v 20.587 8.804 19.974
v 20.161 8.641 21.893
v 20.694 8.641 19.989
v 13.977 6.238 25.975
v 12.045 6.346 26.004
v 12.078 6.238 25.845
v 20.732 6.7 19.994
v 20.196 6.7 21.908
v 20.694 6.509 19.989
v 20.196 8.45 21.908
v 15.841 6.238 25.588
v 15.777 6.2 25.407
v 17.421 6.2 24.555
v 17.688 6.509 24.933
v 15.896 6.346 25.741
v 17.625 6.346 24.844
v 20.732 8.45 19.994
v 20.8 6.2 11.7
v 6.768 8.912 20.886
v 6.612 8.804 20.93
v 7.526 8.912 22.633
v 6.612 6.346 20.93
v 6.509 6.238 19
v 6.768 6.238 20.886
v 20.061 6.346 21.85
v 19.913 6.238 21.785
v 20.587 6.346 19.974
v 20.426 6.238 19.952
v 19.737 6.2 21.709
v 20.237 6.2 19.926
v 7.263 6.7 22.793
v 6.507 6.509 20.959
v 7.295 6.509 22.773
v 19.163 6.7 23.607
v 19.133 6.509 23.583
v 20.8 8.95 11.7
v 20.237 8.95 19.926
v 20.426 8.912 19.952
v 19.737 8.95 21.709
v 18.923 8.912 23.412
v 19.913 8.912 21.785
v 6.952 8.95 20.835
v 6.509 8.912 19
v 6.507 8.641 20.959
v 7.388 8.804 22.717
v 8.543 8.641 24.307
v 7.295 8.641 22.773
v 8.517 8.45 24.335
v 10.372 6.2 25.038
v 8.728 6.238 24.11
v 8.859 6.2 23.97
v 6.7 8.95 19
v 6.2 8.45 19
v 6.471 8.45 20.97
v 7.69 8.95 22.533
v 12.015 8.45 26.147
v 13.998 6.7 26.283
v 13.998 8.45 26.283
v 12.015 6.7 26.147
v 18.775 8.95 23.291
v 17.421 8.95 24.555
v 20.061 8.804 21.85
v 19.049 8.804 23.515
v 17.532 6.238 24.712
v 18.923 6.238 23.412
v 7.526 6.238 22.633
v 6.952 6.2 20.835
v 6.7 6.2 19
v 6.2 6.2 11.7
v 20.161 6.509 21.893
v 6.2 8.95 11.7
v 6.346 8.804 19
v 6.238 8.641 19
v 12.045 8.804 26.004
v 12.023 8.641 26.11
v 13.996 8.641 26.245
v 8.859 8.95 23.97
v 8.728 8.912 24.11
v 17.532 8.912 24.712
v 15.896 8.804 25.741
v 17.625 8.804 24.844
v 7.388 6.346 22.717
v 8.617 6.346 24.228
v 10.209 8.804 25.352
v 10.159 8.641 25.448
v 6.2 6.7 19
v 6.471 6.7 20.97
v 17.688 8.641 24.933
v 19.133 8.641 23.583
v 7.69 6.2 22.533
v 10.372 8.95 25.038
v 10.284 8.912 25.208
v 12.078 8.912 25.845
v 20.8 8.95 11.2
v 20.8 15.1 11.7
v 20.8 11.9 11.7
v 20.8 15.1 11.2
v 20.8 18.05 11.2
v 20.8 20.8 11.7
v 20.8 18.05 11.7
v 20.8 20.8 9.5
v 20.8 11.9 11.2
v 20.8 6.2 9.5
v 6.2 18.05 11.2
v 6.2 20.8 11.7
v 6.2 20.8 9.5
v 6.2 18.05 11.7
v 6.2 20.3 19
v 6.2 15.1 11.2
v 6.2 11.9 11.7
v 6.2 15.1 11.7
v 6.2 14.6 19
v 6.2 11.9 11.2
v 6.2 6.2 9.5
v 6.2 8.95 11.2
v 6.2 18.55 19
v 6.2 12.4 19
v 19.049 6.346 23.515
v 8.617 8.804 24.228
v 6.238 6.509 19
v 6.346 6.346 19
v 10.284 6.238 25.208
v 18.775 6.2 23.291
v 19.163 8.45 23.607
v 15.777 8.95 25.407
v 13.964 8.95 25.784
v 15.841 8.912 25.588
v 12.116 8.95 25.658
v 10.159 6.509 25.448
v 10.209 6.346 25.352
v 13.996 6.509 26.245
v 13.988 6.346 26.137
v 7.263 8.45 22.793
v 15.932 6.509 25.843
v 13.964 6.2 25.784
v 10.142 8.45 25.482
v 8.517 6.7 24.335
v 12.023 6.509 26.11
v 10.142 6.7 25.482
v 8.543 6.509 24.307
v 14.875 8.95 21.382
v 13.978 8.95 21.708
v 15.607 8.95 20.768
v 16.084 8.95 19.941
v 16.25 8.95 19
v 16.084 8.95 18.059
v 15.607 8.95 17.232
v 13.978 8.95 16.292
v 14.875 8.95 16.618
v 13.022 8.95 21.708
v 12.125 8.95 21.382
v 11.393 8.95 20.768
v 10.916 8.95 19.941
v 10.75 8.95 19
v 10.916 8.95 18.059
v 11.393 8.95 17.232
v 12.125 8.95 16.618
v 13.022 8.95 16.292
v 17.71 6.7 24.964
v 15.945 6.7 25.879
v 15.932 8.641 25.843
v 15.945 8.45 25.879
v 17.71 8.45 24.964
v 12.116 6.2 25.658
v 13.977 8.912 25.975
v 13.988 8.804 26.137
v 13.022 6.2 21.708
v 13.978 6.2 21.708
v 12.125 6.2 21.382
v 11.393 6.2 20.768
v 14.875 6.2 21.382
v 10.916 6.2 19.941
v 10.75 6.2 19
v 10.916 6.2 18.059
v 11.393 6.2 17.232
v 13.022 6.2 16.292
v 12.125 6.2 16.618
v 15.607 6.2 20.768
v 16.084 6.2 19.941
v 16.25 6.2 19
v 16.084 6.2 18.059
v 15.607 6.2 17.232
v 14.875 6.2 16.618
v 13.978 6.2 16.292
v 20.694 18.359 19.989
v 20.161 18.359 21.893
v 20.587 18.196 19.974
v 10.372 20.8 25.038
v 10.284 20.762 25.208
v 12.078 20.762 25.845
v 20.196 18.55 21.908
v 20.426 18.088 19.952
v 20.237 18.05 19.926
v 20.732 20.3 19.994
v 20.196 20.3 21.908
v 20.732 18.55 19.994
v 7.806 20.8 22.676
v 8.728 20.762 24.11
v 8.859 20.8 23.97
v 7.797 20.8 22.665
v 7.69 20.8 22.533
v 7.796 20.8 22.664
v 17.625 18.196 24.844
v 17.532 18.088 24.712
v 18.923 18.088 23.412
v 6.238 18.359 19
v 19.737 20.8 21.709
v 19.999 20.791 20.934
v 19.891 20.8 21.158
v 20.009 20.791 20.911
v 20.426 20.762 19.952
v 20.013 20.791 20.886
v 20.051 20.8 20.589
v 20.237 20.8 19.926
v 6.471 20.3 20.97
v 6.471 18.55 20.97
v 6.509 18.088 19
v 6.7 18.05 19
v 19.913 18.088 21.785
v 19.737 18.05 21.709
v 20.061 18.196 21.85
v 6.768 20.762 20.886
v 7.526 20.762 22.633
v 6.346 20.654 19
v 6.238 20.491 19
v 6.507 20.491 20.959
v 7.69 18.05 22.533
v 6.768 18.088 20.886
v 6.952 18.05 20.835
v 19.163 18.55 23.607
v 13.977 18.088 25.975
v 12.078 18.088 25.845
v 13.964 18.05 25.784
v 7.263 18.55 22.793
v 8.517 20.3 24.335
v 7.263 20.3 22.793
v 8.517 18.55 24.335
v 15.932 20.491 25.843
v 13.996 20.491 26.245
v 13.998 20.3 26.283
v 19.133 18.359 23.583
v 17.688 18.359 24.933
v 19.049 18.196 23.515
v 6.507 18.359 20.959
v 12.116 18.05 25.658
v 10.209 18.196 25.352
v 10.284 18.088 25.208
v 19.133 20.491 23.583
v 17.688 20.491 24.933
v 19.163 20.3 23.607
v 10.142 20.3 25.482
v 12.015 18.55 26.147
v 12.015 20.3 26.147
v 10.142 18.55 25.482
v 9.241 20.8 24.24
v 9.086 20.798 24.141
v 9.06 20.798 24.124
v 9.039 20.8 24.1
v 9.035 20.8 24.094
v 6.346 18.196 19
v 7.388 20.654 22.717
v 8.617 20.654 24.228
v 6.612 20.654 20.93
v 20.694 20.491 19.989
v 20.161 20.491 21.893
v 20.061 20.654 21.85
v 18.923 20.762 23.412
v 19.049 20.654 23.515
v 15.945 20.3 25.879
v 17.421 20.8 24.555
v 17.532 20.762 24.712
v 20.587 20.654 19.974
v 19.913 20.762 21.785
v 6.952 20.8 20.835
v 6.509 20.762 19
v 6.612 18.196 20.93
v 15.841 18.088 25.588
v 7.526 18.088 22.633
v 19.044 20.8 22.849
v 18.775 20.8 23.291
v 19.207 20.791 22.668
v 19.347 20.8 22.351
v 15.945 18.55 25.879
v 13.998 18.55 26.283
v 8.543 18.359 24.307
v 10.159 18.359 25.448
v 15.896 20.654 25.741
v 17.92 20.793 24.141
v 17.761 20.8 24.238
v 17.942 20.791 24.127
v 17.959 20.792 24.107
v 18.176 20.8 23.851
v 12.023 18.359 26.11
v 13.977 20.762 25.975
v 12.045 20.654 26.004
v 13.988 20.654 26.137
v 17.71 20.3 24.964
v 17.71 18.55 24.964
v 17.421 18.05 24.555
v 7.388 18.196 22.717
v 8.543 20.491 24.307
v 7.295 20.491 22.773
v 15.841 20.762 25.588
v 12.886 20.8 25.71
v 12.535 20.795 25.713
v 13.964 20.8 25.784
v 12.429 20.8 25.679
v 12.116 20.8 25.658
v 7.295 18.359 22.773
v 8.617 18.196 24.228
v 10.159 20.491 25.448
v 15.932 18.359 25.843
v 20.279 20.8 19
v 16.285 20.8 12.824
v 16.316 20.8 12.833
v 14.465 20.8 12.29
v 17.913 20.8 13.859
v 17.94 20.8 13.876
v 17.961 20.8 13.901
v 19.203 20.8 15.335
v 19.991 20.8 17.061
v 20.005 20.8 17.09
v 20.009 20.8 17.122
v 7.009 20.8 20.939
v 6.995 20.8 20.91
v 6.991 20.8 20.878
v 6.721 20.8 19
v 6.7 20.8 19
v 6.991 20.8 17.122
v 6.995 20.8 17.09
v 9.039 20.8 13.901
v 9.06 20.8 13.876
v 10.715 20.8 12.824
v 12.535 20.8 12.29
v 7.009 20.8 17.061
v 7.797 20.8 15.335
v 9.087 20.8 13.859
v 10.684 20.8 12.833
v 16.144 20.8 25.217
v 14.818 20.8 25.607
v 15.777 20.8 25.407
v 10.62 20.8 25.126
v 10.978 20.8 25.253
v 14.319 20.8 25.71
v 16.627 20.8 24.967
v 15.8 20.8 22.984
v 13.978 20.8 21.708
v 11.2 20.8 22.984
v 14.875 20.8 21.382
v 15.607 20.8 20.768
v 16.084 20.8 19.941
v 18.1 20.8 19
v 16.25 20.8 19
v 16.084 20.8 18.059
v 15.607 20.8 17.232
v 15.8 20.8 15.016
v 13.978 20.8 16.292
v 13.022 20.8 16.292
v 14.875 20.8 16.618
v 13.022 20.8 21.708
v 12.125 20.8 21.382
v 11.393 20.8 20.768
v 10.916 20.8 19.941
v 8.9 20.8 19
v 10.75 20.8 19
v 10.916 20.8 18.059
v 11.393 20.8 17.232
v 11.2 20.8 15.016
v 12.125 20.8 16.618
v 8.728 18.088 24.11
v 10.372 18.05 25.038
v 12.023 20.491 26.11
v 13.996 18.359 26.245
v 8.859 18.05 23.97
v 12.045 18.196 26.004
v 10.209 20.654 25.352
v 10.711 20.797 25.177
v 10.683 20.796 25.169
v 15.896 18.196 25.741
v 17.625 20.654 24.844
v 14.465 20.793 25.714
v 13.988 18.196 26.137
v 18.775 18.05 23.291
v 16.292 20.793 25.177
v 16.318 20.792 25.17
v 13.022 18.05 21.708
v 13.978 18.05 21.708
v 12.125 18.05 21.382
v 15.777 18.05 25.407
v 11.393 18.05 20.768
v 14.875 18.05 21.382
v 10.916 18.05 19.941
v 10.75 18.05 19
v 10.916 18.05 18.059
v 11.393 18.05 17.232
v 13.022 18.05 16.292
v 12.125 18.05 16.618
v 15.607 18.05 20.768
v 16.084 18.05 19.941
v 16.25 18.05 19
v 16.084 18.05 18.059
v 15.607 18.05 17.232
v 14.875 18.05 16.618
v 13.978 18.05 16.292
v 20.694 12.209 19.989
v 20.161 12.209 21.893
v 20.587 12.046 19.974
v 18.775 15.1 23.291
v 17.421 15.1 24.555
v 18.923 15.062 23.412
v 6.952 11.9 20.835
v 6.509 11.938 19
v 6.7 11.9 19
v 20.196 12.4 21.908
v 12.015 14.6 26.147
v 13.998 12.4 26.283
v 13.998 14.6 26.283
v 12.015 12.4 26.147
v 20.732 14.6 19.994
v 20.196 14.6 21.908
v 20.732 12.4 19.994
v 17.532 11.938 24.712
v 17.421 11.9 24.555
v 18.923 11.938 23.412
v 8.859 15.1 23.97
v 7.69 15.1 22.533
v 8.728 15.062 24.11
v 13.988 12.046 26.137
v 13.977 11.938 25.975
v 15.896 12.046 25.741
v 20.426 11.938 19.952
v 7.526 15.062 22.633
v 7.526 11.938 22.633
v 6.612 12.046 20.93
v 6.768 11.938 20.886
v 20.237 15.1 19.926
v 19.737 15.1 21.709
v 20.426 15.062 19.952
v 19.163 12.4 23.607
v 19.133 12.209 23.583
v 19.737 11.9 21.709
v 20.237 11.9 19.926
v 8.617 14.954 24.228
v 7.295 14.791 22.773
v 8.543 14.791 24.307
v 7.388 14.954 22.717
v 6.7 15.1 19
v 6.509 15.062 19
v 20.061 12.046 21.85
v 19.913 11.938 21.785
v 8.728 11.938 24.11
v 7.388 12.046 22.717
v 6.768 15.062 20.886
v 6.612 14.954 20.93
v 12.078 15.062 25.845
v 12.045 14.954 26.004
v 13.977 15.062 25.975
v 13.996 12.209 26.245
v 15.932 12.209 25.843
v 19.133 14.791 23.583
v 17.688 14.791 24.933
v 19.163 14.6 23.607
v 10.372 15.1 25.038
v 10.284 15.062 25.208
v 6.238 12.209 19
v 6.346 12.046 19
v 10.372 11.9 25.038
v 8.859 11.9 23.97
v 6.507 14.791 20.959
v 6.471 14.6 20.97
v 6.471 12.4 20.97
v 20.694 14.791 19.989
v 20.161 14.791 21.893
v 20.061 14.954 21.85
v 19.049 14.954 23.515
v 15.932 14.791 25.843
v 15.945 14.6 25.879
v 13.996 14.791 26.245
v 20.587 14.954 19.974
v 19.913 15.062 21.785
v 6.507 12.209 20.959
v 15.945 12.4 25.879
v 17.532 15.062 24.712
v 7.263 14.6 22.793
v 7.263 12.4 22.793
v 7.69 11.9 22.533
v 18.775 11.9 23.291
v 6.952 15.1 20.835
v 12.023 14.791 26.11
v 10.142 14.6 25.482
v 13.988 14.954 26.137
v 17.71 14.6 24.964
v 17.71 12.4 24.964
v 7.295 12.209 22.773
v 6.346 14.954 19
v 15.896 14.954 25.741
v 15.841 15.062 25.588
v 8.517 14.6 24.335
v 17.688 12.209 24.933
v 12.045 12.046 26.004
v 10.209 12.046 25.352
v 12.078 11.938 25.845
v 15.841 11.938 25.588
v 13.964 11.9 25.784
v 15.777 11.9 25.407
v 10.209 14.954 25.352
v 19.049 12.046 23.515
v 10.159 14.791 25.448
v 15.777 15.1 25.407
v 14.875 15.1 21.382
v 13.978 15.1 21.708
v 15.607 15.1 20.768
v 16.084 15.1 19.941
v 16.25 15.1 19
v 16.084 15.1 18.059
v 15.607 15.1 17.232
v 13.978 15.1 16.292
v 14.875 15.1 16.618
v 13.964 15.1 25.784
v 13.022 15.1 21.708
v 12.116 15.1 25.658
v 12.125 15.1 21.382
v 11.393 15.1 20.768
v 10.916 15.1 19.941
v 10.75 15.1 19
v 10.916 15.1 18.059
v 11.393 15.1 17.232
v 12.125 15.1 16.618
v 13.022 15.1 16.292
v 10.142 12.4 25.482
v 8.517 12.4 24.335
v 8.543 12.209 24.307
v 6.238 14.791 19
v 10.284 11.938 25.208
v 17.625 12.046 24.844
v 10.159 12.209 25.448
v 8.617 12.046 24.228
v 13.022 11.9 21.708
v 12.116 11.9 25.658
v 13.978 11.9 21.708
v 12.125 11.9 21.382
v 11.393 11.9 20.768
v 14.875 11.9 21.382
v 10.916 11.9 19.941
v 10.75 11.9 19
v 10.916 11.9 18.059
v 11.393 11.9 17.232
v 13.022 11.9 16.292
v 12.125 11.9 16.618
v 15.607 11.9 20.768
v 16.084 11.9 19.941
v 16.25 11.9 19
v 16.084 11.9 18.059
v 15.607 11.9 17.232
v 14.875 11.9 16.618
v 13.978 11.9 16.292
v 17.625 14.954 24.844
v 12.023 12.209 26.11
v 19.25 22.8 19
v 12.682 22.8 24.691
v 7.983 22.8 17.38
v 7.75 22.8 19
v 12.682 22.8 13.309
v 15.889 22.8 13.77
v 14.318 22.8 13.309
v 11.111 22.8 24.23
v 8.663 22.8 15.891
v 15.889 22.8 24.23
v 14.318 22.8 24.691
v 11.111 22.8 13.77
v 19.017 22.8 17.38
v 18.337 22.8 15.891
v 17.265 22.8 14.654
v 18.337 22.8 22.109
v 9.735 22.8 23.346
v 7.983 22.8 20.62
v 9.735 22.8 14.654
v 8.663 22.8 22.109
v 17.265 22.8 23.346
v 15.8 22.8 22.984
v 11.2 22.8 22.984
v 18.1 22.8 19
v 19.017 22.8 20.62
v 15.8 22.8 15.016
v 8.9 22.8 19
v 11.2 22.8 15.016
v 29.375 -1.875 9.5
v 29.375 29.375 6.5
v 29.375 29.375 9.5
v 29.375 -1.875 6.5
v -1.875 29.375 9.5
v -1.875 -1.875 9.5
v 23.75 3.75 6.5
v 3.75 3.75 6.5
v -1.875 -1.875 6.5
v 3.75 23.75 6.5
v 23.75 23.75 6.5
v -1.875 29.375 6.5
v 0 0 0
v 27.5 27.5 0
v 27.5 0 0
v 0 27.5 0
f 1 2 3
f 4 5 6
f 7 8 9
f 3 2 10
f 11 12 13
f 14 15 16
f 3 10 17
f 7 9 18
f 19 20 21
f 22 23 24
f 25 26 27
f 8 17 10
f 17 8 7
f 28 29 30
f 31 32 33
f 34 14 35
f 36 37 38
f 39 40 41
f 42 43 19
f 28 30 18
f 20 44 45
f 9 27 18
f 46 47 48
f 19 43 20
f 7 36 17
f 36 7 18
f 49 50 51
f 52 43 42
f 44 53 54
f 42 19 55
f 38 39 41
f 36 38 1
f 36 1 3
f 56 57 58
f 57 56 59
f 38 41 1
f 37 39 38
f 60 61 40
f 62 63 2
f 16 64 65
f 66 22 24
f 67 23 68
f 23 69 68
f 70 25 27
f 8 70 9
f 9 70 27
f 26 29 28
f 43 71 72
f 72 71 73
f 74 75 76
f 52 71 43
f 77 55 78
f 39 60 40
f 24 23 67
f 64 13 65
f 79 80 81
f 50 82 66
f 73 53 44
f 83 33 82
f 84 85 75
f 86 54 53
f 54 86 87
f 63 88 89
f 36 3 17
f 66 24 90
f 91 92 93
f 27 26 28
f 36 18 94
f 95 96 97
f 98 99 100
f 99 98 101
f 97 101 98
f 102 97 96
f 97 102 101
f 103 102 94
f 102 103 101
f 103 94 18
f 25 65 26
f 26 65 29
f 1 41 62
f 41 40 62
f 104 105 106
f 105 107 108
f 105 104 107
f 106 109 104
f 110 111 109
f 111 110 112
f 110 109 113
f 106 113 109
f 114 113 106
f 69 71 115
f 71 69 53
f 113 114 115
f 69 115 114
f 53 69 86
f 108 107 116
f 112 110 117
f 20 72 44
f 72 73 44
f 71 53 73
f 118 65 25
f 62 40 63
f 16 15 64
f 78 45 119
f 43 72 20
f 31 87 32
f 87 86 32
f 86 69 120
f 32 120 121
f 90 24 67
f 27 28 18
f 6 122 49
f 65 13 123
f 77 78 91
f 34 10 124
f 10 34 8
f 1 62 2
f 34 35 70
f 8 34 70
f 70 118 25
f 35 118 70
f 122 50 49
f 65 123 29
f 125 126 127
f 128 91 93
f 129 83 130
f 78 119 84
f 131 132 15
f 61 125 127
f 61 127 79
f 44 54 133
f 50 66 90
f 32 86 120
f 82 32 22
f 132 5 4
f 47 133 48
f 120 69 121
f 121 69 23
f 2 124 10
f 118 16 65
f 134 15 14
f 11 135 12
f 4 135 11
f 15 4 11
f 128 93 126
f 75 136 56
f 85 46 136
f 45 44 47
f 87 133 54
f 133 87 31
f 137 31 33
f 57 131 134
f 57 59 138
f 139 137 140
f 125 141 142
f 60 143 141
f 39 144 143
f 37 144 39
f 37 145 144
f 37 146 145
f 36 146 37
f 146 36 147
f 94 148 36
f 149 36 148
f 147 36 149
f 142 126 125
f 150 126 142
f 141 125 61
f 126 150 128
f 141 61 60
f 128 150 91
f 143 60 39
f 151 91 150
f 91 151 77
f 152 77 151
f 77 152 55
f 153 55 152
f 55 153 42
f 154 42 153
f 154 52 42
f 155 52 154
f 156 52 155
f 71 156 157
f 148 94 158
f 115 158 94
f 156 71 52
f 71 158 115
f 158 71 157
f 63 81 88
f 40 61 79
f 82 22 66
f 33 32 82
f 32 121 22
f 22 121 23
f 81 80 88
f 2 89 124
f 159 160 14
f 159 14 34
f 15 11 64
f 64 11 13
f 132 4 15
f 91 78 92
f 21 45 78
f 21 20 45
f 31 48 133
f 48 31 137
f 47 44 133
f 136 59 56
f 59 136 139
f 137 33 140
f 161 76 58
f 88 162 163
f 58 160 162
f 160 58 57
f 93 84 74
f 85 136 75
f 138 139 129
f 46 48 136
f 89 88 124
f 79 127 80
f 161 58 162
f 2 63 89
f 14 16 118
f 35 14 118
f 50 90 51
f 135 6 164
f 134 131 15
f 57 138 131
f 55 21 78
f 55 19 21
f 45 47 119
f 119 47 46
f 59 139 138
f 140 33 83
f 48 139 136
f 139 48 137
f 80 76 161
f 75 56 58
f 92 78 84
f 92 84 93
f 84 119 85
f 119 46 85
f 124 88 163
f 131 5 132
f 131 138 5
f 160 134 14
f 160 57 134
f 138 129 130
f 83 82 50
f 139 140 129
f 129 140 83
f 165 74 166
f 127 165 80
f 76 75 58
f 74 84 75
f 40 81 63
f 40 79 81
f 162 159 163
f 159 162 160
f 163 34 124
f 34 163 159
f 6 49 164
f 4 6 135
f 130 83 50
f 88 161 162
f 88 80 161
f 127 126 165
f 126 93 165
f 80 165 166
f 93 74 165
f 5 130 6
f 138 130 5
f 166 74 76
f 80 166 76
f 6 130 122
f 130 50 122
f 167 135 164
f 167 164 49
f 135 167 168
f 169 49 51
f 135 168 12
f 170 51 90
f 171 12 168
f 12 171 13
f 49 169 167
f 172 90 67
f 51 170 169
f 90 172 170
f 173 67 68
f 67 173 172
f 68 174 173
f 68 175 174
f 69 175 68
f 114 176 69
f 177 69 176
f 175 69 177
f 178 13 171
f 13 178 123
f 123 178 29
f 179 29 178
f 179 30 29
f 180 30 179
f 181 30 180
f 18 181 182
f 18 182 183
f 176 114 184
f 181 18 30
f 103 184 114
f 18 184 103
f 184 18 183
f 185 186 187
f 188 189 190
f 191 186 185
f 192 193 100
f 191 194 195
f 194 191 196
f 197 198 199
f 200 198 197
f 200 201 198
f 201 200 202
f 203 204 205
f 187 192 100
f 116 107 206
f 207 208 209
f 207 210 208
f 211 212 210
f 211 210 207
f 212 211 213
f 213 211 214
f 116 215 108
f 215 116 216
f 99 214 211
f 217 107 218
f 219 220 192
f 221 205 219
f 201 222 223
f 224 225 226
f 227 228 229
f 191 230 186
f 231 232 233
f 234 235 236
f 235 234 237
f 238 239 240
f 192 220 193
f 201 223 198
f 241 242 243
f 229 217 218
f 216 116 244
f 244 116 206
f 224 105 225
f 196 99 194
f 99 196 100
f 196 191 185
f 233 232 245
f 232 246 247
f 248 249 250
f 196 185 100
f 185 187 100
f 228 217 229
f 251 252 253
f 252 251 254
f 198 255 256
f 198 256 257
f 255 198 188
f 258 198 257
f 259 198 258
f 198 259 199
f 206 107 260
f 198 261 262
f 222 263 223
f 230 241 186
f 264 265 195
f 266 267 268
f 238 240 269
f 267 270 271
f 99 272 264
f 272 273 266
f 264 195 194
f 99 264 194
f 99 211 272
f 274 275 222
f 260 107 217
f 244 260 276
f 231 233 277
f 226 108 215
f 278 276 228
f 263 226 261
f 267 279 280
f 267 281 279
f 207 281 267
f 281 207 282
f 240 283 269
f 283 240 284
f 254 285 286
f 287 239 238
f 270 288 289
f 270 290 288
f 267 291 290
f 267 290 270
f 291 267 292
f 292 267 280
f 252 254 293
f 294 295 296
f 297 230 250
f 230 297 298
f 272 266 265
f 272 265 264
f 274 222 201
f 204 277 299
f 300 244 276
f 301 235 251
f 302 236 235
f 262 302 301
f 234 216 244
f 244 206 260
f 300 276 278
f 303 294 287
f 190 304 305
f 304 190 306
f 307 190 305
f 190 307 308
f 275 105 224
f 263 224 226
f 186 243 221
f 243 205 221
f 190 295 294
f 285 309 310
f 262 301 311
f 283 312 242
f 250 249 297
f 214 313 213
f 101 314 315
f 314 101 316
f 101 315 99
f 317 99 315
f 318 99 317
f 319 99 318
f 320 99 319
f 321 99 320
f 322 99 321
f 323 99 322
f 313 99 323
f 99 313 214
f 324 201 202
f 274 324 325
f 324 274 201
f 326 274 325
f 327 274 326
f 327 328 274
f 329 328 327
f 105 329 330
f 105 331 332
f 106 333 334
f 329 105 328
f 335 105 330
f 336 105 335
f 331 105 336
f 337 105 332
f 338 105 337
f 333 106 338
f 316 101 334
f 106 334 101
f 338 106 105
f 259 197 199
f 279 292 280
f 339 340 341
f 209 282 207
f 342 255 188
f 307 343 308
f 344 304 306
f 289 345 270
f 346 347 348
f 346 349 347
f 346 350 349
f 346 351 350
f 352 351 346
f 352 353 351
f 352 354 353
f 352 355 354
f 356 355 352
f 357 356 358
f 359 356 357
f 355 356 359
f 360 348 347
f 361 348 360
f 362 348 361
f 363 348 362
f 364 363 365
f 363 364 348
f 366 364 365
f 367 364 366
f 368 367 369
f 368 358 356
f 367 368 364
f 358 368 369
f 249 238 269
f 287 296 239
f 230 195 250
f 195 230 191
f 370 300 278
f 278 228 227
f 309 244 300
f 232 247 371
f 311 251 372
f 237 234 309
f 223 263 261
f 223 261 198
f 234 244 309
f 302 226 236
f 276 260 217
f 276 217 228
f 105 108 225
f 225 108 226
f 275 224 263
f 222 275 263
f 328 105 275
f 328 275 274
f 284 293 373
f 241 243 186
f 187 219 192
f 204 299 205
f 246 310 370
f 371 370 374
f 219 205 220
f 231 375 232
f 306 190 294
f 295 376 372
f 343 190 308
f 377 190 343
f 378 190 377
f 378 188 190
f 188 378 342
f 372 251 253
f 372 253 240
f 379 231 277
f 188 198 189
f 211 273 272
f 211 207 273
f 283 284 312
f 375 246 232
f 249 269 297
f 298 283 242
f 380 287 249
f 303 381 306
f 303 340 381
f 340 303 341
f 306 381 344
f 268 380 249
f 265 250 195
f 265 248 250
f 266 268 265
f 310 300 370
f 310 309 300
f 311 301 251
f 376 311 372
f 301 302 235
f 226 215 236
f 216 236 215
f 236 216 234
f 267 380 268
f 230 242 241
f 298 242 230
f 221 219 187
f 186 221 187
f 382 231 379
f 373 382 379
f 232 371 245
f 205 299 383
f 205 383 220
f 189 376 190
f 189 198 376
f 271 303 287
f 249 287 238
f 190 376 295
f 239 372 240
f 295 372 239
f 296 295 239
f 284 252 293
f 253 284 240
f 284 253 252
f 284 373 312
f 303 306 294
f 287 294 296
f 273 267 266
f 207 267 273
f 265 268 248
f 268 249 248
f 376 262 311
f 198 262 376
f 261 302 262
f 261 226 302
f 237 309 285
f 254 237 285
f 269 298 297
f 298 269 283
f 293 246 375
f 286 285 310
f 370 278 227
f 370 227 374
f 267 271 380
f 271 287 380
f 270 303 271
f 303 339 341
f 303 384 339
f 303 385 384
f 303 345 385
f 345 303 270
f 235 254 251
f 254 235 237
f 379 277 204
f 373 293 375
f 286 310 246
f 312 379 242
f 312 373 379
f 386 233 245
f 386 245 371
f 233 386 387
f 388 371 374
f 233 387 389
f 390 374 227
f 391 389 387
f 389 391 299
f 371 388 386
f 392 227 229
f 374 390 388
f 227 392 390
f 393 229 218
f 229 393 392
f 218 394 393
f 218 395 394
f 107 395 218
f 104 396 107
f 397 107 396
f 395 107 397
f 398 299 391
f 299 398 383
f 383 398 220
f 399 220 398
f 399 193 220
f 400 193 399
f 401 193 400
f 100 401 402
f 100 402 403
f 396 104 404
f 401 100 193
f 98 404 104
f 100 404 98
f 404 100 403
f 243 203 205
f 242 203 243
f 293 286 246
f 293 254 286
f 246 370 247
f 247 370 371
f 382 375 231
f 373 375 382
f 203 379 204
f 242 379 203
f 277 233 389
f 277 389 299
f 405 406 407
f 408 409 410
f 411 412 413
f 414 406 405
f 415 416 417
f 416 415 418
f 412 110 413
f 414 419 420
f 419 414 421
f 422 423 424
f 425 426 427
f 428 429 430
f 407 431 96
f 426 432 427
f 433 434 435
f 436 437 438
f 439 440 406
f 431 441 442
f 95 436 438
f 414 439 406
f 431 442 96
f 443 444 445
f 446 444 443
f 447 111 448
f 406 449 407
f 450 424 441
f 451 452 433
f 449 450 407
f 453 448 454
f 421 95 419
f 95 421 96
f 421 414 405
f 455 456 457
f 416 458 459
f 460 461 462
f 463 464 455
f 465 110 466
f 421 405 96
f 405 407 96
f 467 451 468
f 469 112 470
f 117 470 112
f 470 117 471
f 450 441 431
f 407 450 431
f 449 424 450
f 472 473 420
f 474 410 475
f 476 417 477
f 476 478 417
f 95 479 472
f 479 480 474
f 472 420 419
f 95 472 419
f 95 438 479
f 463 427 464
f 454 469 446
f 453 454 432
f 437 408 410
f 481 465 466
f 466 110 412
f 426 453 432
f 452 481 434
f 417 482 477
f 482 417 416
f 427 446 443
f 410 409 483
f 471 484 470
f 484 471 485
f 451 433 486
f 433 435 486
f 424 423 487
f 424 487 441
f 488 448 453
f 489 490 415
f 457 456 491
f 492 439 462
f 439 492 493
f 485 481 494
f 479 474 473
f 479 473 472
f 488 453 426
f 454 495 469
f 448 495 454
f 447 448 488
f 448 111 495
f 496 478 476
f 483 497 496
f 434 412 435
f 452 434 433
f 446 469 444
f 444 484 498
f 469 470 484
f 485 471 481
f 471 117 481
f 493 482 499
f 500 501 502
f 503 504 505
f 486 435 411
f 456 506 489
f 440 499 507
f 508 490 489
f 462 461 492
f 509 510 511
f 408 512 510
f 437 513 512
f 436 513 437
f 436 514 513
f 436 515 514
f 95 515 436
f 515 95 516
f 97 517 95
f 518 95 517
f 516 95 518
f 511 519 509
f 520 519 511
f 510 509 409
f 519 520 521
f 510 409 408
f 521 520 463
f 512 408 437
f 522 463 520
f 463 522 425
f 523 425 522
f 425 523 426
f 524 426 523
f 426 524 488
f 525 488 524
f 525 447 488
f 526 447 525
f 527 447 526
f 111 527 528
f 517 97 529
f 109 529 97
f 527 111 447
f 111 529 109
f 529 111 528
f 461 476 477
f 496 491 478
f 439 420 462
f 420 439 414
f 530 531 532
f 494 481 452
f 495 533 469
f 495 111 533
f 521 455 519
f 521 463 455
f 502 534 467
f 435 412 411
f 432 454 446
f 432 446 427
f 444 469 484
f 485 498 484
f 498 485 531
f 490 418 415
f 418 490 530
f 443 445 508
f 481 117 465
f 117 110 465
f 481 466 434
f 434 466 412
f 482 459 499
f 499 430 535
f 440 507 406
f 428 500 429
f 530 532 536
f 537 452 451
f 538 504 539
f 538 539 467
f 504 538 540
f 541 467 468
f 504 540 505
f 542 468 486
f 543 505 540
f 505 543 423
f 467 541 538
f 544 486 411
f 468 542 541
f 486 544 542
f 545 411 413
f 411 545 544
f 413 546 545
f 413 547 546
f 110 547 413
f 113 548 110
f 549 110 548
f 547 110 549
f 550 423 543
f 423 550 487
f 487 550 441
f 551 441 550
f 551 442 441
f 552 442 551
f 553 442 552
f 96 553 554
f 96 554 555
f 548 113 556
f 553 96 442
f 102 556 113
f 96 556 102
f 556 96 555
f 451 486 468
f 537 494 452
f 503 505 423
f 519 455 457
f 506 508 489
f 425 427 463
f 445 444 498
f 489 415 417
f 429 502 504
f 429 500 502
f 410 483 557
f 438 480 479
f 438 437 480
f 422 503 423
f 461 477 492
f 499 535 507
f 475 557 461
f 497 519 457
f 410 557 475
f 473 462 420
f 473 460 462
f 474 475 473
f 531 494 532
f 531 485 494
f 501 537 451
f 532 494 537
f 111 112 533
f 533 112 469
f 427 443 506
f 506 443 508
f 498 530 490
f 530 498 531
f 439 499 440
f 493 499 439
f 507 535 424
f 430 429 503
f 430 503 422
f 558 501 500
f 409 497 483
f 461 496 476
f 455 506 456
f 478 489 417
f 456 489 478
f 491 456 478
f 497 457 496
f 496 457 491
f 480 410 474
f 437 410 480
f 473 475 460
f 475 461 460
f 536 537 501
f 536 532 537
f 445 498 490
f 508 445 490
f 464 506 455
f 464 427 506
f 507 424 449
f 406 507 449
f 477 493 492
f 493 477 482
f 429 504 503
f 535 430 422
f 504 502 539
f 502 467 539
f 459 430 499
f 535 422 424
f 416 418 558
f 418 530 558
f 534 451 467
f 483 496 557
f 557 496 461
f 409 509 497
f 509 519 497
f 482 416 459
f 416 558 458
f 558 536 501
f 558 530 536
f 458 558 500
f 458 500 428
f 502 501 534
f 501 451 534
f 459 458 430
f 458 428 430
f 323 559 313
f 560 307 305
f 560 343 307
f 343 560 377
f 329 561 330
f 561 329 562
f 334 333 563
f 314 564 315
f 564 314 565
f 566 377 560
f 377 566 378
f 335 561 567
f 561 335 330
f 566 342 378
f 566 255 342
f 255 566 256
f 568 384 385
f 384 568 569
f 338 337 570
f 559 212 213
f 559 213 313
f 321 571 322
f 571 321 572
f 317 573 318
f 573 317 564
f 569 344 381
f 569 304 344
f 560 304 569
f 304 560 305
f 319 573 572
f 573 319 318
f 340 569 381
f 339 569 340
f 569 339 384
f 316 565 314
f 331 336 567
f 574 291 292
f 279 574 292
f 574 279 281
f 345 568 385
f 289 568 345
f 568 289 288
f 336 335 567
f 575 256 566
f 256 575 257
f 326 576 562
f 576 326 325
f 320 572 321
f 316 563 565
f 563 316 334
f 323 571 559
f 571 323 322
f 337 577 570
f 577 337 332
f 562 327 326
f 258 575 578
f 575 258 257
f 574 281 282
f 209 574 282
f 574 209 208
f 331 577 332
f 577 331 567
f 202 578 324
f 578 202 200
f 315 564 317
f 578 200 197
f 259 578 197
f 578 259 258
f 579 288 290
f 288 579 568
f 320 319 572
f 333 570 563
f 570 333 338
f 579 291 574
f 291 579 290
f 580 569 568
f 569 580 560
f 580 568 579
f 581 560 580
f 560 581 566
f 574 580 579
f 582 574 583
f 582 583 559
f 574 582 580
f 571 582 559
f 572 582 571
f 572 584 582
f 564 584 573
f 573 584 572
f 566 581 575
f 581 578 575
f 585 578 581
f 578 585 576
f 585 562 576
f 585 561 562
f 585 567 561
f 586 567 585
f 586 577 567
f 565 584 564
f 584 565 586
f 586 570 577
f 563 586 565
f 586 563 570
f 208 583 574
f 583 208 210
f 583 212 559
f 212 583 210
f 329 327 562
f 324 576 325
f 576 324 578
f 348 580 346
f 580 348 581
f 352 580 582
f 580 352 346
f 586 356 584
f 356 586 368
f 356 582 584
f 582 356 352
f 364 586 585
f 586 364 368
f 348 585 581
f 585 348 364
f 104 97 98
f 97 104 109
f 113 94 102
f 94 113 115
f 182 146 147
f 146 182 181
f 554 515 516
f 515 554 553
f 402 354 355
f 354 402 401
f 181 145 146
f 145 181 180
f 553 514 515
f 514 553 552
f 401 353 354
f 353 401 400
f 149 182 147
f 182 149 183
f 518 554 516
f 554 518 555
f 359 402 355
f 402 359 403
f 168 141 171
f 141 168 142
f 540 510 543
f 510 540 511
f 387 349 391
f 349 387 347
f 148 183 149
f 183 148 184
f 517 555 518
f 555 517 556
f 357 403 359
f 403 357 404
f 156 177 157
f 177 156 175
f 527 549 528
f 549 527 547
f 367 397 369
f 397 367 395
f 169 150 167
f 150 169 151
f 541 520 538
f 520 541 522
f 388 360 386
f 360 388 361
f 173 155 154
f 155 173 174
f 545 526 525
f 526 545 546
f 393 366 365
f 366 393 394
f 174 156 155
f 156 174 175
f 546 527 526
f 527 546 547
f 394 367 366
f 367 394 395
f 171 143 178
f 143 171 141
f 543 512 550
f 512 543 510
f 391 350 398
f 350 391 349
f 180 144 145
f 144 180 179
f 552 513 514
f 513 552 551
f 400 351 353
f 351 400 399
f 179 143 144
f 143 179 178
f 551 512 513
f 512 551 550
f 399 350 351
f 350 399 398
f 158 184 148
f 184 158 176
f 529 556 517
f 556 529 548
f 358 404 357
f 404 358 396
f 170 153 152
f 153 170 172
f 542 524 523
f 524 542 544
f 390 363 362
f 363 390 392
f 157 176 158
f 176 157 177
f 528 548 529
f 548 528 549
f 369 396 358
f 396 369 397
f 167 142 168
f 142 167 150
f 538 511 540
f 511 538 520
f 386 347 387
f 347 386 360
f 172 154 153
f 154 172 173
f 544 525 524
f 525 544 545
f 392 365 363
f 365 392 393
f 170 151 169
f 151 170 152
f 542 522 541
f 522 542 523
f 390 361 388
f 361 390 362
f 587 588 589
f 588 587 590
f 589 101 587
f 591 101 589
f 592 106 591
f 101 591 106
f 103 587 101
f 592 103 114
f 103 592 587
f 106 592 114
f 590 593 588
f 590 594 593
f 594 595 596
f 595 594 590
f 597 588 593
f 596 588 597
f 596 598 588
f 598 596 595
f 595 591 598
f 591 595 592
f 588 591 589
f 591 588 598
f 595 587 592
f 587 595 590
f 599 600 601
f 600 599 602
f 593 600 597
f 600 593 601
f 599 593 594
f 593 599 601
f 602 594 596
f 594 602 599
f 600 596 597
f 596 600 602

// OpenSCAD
use <gopro_mounts_mooncactus.scad>

tw = 20;
bw = 27.5;
m = (bw-tw)/2;
h = 6.5;

union() {
    translate([27/2, 27/2, 19]) rotate([-90,0,0]) gopro_connector("triple");
    
    translate([-m/2,-m/2,6.5]) cube([bw+m,bw+m,3]);

    cubePoints = [
      [0, 0, 0],
      [bw, 0, 0],
      [bw, bw, 0],
      [0, bw, 0],
      [m, m, h],
      [m+tw, m, h],
      [m+tw, m+tw, h],
      [m, m+tw, h],
    ];
    cubeFaces = [
      [0,1,2,3],  // bottom
      [4,5,1,0],  // front
      [7,6,5,4],  // top
      [5,6,2,1],  // right
      [6,7,3,2],  // back
      [7,4,0,3]
    ]; // left
    polyhedron( cubePoints, cubeFaces );
}
